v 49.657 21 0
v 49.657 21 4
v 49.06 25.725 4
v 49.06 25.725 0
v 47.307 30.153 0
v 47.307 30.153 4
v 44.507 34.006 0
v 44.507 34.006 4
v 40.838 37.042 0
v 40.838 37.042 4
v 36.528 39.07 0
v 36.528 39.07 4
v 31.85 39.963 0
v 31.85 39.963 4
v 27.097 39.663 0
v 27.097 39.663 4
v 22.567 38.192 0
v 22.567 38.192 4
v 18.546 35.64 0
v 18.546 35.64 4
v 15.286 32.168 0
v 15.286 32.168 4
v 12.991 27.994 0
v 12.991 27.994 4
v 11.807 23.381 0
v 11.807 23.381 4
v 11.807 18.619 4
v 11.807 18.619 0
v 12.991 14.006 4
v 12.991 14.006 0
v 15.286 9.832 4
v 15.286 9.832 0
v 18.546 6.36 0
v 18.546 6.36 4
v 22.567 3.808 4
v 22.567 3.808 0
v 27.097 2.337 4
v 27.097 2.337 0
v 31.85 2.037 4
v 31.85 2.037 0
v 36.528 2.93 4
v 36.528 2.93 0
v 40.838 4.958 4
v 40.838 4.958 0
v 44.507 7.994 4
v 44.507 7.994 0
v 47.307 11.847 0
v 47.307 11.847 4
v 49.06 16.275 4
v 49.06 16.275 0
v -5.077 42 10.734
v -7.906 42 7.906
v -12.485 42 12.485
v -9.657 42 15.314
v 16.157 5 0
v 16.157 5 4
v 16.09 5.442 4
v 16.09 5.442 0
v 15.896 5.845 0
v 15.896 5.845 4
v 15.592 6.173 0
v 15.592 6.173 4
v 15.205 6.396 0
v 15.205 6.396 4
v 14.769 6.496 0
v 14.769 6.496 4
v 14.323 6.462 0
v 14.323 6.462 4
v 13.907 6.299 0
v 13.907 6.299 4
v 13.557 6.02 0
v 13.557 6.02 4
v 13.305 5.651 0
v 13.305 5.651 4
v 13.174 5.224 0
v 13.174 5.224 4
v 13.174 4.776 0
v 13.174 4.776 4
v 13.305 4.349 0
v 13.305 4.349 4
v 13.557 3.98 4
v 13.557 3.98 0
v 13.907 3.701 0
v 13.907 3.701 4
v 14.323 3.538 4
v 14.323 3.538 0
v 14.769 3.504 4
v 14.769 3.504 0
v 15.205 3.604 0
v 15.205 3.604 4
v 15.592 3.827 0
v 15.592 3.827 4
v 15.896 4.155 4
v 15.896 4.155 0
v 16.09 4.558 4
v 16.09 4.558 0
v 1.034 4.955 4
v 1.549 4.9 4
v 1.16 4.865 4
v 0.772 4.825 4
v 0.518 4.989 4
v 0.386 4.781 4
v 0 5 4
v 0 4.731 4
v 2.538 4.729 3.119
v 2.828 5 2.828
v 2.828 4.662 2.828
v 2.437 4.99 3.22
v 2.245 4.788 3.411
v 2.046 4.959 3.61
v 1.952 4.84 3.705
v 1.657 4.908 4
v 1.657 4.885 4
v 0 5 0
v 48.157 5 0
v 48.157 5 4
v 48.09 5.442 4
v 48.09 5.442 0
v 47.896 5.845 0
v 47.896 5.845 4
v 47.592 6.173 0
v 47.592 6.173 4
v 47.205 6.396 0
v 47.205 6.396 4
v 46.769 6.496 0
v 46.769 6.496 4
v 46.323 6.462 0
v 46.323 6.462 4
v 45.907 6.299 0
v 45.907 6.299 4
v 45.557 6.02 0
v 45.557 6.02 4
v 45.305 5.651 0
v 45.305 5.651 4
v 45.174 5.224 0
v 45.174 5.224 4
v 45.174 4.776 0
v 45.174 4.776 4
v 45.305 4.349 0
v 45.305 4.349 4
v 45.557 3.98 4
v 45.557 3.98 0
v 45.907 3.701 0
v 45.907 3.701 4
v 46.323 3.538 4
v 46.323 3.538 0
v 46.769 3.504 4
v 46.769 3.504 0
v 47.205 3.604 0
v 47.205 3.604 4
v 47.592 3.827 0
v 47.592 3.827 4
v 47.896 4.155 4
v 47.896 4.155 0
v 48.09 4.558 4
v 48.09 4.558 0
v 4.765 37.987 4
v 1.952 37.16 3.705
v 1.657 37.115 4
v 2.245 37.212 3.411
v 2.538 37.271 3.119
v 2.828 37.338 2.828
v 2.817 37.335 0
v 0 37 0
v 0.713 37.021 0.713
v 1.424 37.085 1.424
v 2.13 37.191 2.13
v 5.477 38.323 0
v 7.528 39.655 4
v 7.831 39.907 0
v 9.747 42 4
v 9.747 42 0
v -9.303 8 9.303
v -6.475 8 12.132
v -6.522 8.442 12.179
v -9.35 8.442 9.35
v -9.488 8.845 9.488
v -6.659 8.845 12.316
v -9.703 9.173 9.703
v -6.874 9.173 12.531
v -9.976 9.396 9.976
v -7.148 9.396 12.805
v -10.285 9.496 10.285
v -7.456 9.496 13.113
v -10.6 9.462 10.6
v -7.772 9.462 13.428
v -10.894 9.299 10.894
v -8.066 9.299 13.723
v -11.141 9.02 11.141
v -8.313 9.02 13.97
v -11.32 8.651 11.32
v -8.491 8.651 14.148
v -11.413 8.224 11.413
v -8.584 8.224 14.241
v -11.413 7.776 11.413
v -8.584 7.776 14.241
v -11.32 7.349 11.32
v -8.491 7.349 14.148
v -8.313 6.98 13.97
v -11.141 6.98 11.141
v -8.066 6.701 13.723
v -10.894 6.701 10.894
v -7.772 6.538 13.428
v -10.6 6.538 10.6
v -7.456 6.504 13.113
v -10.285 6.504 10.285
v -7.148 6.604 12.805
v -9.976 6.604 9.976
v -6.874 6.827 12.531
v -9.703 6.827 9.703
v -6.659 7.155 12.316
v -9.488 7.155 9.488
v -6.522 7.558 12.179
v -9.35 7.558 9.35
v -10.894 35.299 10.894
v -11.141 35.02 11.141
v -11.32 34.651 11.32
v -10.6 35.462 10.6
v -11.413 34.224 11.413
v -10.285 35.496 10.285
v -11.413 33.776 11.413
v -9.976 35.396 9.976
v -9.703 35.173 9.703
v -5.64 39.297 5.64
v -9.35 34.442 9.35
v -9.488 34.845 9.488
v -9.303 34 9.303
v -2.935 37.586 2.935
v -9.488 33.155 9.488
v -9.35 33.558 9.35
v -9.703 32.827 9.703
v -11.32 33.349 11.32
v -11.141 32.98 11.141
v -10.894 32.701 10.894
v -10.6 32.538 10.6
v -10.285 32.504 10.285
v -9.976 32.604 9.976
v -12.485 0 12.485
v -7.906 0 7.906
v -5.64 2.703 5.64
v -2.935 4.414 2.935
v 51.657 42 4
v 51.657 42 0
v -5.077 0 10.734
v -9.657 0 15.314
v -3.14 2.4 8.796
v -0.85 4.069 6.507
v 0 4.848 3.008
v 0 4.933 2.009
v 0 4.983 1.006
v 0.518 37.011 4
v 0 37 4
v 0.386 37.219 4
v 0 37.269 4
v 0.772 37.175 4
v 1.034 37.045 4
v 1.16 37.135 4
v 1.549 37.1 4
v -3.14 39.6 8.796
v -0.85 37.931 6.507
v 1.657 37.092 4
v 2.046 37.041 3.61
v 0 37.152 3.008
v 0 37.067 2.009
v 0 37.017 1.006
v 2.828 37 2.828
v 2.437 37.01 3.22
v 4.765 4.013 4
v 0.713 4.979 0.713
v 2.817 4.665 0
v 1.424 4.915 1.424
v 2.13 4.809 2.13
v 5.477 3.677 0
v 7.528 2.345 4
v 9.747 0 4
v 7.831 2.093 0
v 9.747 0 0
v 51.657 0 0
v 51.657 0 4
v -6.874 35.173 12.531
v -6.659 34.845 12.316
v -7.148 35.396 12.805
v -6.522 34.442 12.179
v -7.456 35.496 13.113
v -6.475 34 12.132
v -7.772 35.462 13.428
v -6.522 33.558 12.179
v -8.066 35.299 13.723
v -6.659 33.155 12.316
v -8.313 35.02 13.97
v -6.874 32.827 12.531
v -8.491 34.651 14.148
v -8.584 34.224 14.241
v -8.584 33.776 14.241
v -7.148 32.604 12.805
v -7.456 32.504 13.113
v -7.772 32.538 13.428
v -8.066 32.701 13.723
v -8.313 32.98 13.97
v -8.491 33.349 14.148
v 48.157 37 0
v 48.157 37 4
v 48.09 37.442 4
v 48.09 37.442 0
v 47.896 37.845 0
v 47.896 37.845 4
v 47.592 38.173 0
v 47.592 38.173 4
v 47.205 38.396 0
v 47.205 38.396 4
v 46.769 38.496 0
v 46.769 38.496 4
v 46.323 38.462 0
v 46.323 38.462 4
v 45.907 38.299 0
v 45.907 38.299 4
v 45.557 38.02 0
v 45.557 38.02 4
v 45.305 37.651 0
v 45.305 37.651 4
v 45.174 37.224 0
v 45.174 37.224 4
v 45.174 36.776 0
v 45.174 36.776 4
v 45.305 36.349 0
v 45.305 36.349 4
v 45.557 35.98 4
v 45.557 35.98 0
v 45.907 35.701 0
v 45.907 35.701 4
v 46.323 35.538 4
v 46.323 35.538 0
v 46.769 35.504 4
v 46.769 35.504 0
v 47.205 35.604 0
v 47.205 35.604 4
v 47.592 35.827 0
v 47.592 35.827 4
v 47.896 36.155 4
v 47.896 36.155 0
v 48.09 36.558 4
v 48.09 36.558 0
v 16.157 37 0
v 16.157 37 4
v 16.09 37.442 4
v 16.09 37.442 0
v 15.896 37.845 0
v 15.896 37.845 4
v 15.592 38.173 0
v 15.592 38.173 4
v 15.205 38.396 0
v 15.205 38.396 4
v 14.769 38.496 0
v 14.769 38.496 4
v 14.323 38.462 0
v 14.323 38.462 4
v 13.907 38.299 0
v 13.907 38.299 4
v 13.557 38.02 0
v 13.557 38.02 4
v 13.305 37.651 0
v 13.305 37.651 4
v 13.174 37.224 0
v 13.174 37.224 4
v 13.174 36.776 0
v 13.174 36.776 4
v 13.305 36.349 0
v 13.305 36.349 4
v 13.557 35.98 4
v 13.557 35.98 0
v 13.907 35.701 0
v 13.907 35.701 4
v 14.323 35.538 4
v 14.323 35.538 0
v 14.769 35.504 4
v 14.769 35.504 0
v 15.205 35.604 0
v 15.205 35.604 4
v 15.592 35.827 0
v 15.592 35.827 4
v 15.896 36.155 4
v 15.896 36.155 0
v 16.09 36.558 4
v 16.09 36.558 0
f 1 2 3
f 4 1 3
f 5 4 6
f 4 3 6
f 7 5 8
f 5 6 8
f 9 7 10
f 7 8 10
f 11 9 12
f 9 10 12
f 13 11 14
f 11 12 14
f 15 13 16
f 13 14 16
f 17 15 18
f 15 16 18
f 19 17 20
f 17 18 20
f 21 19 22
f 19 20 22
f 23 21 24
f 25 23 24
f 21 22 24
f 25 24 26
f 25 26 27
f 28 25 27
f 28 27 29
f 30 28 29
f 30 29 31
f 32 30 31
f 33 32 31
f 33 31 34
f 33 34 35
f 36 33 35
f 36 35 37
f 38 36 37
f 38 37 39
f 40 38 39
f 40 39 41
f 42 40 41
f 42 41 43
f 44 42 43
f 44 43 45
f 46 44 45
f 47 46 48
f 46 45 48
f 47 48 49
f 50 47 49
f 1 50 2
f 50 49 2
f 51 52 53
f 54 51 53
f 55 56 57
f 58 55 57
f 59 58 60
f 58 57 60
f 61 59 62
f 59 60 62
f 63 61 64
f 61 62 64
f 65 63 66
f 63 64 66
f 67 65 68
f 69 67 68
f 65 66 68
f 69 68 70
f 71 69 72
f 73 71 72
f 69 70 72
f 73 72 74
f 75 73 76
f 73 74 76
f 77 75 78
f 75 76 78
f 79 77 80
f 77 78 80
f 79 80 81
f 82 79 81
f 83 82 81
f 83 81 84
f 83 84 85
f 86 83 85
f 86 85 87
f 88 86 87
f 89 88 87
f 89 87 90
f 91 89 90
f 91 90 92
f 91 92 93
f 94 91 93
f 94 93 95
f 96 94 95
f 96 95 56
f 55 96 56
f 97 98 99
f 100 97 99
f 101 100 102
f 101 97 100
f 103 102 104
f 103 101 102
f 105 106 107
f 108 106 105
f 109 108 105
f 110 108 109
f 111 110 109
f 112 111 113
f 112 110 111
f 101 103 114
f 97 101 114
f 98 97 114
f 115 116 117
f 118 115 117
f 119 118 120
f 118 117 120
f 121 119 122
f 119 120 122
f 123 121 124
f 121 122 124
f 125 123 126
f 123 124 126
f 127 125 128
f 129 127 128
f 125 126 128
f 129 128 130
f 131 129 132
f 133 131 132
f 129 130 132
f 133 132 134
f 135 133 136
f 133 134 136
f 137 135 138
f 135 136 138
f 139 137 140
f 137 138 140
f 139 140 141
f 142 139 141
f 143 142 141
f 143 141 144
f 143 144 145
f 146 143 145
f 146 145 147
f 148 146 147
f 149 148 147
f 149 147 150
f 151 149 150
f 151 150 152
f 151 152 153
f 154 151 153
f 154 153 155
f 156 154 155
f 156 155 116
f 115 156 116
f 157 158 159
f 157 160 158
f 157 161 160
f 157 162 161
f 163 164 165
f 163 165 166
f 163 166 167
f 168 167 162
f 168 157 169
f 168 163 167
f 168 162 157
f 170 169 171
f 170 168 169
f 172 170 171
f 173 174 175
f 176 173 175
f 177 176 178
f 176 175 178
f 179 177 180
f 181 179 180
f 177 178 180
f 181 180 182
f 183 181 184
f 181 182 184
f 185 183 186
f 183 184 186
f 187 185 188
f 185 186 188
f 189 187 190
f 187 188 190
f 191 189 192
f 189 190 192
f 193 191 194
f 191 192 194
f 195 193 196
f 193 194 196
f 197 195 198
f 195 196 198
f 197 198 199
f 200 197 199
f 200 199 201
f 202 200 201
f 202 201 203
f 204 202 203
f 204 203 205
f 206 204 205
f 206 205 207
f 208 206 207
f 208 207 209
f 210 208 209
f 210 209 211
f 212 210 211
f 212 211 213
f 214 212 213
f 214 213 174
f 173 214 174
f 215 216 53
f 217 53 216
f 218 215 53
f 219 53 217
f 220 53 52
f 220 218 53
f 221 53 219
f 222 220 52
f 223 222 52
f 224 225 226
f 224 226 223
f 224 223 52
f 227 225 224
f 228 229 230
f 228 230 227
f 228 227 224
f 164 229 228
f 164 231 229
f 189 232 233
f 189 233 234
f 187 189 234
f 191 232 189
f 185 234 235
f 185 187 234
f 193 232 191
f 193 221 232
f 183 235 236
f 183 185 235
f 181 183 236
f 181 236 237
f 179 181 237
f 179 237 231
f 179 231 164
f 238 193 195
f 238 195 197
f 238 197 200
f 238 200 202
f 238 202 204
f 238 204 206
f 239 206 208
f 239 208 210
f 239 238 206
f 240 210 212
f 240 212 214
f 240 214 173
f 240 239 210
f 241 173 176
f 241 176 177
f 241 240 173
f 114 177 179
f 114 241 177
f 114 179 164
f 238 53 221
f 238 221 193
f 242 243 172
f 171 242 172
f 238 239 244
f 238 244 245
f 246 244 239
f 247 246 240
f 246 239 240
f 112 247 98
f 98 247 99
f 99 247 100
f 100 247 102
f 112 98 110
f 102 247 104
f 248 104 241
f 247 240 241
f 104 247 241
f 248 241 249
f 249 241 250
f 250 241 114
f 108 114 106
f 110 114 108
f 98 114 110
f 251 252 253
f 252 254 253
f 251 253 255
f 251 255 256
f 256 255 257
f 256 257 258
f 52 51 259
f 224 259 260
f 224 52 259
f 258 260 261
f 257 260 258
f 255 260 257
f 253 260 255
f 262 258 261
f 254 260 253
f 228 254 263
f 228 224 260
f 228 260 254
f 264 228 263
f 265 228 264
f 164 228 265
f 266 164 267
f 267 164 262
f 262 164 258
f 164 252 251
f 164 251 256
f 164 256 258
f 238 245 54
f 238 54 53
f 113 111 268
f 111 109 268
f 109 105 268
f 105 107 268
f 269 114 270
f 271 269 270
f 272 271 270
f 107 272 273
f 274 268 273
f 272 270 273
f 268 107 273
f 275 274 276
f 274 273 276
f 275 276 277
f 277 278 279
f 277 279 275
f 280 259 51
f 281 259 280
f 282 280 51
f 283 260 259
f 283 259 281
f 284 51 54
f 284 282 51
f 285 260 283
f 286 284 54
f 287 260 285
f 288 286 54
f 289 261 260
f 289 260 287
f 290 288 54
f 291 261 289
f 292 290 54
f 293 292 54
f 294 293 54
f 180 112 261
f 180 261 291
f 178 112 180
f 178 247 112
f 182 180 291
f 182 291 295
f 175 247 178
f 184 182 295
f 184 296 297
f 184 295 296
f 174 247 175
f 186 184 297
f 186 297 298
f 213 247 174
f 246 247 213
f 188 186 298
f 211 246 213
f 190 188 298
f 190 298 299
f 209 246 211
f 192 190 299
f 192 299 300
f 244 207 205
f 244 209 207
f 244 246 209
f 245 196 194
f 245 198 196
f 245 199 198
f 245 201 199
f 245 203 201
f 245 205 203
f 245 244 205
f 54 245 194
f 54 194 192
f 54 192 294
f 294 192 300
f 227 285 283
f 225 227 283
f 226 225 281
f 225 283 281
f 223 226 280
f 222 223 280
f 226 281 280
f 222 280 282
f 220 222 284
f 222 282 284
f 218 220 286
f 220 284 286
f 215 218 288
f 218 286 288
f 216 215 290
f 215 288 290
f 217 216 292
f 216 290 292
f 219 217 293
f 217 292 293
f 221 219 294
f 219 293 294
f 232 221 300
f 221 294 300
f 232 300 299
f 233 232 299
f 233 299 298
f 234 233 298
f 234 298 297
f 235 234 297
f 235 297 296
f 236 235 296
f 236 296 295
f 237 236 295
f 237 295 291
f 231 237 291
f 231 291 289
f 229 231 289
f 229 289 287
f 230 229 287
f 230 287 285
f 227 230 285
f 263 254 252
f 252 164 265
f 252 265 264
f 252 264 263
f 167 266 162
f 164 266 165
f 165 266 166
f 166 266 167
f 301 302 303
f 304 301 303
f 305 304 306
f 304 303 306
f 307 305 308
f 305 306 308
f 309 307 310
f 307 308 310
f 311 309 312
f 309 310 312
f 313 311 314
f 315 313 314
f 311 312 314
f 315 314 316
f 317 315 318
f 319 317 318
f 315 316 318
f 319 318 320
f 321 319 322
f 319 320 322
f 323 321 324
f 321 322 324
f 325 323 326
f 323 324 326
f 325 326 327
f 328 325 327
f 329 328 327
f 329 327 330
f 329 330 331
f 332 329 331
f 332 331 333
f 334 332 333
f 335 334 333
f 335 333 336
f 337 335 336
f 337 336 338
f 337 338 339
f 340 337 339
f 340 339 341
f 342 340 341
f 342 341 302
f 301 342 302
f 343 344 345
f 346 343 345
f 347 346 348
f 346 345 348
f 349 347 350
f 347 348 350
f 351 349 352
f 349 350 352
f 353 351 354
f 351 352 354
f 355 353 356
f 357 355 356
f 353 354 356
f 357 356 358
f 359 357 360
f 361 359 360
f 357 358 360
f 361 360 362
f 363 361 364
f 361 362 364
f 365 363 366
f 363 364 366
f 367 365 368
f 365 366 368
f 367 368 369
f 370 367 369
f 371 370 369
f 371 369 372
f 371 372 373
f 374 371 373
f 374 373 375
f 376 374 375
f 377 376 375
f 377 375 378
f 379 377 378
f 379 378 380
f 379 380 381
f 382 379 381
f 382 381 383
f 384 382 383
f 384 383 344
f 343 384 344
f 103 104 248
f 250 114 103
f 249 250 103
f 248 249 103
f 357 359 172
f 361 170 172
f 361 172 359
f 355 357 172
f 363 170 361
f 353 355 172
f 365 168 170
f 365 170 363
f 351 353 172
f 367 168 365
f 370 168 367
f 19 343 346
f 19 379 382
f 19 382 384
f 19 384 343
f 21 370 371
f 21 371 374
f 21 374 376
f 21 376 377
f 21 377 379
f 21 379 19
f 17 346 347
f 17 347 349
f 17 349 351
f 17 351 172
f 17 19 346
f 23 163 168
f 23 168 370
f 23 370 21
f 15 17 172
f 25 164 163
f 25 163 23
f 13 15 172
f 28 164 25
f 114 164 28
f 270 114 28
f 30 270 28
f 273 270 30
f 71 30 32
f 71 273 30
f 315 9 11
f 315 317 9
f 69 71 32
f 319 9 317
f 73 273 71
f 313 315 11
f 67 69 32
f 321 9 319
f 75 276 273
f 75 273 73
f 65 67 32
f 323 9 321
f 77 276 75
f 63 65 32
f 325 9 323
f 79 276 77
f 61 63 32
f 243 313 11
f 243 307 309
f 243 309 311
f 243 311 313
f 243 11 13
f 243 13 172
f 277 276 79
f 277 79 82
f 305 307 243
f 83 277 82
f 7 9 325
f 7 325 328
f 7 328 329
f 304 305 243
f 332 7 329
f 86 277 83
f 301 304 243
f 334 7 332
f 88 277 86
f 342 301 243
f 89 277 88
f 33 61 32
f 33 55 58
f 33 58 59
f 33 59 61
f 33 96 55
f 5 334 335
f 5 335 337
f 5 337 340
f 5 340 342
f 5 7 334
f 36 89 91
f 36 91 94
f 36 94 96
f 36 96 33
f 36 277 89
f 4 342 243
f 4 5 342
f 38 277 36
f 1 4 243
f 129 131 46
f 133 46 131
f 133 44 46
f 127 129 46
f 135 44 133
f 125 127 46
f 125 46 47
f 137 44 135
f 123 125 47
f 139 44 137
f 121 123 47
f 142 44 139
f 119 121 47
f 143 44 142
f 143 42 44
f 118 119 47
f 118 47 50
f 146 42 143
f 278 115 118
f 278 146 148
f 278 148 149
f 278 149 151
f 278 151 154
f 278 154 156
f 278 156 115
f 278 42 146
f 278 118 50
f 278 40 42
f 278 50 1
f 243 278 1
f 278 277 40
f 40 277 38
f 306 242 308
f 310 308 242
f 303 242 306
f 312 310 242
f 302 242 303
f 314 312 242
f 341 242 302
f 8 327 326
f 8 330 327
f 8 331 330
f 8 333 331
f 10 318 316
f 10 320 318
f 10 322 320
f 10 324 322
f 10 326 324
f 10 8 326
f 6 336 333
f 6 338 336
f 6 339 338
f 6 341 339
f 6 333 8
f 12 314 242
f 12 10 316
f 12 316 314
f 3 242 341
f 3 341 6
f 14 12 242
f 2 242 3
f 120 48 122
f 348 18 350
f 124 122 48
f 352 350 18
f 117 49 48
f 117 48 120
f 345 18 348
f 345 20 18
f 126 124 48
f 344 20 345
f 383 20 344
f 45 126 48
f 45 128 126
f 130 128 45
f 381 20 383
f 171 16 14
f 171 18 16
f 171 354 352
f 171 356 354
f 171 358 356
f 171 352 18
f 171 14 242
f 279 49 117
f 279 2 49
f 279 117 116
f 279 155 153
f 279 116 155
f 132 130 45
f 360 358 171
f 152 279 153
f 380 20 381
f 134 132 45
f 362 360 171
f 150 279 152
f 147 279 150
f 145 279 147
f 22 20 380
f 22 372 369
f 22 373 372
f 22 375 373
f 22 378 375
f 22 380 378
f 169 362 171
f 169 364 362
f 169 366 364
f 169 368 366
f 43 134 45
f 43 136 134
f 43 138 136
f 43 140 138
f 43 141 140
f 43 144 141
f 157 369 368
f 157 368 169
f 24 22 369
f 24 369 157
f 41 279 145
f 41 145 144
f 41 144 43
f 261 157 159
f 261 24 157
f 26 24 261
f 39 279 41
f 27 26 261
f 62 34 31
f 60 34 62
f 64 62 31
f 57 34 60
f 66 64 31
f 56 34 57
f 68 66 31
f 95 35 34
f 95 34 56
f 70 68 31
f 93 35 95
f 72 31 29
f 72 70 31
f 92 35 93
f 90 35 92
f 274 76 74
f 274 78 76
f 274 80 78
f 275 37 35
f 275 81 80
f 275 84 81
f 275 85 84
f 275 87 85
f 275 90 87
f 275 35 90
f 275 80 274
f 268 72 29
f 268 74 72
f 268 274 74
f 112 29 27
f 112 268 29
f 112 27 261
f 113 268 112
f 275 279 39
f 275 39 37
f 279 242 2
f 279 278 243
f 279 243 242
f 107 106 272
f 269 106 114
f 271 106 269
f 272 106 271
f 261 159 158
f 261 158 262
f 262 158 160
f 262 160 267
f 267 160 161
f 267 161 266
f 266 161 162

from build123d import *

# Parameters (mm, degrees)
BOSS_EXTRUDE1_DEPTH = 42
CUT_EXTRUDE1_REACH  = 14.828
SKETCH2_R           = 1.5
CUT_EXTRUDE2_REACH  = 6
SKETCH3_R           = 1.5
SKETCH3_R_2         = 19
CUT_EXTRUDE3_DEPTH  = 4
CUT_EXTRUDE4_DEPTH  = 4


with BuildPart() as part:
    # Sketch1 → Boss-Extrude1 (new body)
    with BuildSketch(Plane(origin=(0, 0, 0), x_dir=(1, 0, 0), z_dir=(0, 1, 0))):
        Polygon((0, 0), (51.656854249, 0), (51.656854249, -4), (1.656854249, -4), (-9.656854249, -15.313708499), (-12.485281374, -12.485281374), align=None)
    extrude(amount=BOSS_EXTRUDE1_DEPTH)

    # Sketch2 → Cut-Extrude1 (cut, up to next)
    with BuildSketch(Plane(origin=(2.828427125, 0, 2.828427125), x_dir=(0.707106781, 0, -0.707106781), z_dir=(0.707106781, 0, 0.707106781)), mode=Mode.PRIVATE) as cut_extrude1_sk1:
        with Locations((-14.656854249, 34)):
            Circle(SKETCH2_R)
    cut_extrude1_tool1 = extrude(cut_extrude1_sk1.sketch, amount=-CUT_EXTRUDE1_REACH, mode=Mode.PRIVATE) & part.part
    add(cut_extrude1_tool1.solids().sort_by_distance((-7.535534, 34, 13.192388))[0], mode=Mode.SUBTRACT)
    # Sketch2 → Cut-Extrude1 (cut, up to next)
    with BuildSketch(Plane(origin=(2.828427125, 0, 2.828427125), x_dir=(0.707106781, 0, -0.707106781), z_dir=(0.707106781, 0, 0.707106781)), mode=Mode.PRIVATE) as cut_extrude1_sk2:
        with Locations((-14.656854249, 8)):
            Circle(SKETCH2_R)
    cut_extrude1_tool2 = extrude(cut_extrude1_sk2.sketch, amount=-CUT_EXTRUDE1_REACH, mode=Mode.PRIVATE) & part.part
    add(cut_extrude1_tool2.solids().sort_by_distance((-7.535534, 8, 13.192388))[0], mode=Mode.SUBTRACT)

    # Sketch3 → Cut-Extrude2 (cut, up to next)
    with BuildSketch(Plane.XY.offset(4), mode=Mode.PRIVATE) as cut_extrude2_sk1:
        with Locations((14.656854249, 37)):
            Circle(SKETCH3_R)
    cut_extrude2_tool1 = extrude(cut_extrude2_sk1.sketch, amount=-CUT_EXTRUDE2_REACH, mode=Mode.PRIVATE) & part.part
    add(cut_extrude2_tool1.solids().sort_by_distance((14.656854, 37, 4))[0], mode=Mode.SUBTRACT)
    # Sketch3 → Cut-Extrude2 (cut, up to next)
    with BuildSketch(Plane.XY.offset(4), mode=Mode.PRIVATE) as cut_extrude2_sk2:
        with Locations((46.656854249, 37)):
            Circle(SKETCH3_R)
    cut_extrude2_tool2 = extrude(cut_extrude2_sk2.sketch, amount=-CUT_EXTRUDE2_REACH, mode=Mode.PRIVATE) & part.part
    add(cut_extrude2_tool2.solids().sort_by_distance((46.656854, 37, 4))[0], mode=Mode.SUBTRACT)
    # Sketch3 → Cut-Extrude2 (cut, up to next)
    with BuildSketch(Plane.XY.offset(4), mode=Mode.PRIVATE) as cut_extrude2_sk3:
        with Locations((46.656854249, 5)):
            Circle(SKETCH3_R)
    cut_extrude2_tool3 = extrude(cut_extrude2_sk3.sketch, amount=-CUT_EXTRUDE2_REACH, mode=Mode.PRIVATE) & part.part
    add(cut_extrude2_tool3.solids().sort_by_distance((46.656854, 5, 4))[0], mode=Mode.SUBTRACT)
    # Sketch3 → Cut-Extrude2 (cut, up to next)
    with BuildSketch(Plane.XY.offset(4), mode=Mode.PRIVATE) as cut_extrude2_sk4:
        with Locations((14.656854249, 5)):
            Circle(SKETCH3_R)
    cut_extrude2_tool4 = extrude(cut_extrude2_sk4.sketch, amount=-CUT_EXTRUDE2_REACH, mode=Mode.PRIVATE) & part.part
    add(cut_extrude2_tool4.solids().sort_by_distance((14.656854, 5, 4))[0], mode=Mode.SUBTRACT)
    # Sketch3 → Cut-Extrude2 (cut, up to next)
    with BuildSketch(Plane.XY.offset(4), mode=Mode.PRIVATE) as cut_extrude2_sk5:
        with Locations((30.656854249, 21)):
            Circle(SKETCH3_R_2)
    cut_extrude2_tool5 = extrude(cut_extrude2_sk5.sketch, amount=-CUT_EXTRUDE2_REACH, mode=Mode.PRIVATE) & part.part
    add(cut_extrude2_tool5.solids().sort_by_distance((30.656854, 21, 4))[0], mode=Mode.SUBTRACT)

    # Sketch6 → Cut-Extrude3 (cut)
    with BuildSketch(Plane(origin=(0, 0, 0), x_dir=(-0.707106781, 0, 0.707106781), z_dir=(-0.707106781, 0, -0.707106781))):
        with BuildLine():
            Line((0, 5), (0, 0))
            Line((0, 0), (11.180339887, 0))
            ThreePointArc((11.180339887, 0), (6.123724357, 3.693063938), (0, 5))
        make_face()
        with BuildLine():
            Line((0, 37), (0, 42))
            Line((0, 42), (11.180339887, 42))
            ThreePointArc((11.180339887, 42), (6.123724357, 38.306936062), (0, 37))
        make_face()
    extrude(amount=-CUT_EXTRUDE3_DEPTH, mode=Mode.SUBTRACT)

    # Sketch7 → Cut-Extrude4 (cut)
    with BuildSketch(Plane(origin=(0, 0, 0), x_dir=(-1, 0, 0), z_dir=(0, 0, -1))):
        with BuildLine():
            Line((-9.746794345, 42), (0, 42))
            Line((0, 42), (0, 37))
            ThreePointArc((0, 37), (-5.477225575, 38.322921748), (-9.746794345, 42))
        make_face()
        with BuildLine():
            Line((-9.746794345, 0), (0, 0))
            Line((0, 0), (0, 5))
            ThreePointArc((0, 5), (-5.477225575, 3.677078252), (-9.746794345, 0))
        make_face()
    extrude(amount=-CUT_EXTRUDE4_DEPTH, mode=Mode.SUBTRACT)


solid = part.part
